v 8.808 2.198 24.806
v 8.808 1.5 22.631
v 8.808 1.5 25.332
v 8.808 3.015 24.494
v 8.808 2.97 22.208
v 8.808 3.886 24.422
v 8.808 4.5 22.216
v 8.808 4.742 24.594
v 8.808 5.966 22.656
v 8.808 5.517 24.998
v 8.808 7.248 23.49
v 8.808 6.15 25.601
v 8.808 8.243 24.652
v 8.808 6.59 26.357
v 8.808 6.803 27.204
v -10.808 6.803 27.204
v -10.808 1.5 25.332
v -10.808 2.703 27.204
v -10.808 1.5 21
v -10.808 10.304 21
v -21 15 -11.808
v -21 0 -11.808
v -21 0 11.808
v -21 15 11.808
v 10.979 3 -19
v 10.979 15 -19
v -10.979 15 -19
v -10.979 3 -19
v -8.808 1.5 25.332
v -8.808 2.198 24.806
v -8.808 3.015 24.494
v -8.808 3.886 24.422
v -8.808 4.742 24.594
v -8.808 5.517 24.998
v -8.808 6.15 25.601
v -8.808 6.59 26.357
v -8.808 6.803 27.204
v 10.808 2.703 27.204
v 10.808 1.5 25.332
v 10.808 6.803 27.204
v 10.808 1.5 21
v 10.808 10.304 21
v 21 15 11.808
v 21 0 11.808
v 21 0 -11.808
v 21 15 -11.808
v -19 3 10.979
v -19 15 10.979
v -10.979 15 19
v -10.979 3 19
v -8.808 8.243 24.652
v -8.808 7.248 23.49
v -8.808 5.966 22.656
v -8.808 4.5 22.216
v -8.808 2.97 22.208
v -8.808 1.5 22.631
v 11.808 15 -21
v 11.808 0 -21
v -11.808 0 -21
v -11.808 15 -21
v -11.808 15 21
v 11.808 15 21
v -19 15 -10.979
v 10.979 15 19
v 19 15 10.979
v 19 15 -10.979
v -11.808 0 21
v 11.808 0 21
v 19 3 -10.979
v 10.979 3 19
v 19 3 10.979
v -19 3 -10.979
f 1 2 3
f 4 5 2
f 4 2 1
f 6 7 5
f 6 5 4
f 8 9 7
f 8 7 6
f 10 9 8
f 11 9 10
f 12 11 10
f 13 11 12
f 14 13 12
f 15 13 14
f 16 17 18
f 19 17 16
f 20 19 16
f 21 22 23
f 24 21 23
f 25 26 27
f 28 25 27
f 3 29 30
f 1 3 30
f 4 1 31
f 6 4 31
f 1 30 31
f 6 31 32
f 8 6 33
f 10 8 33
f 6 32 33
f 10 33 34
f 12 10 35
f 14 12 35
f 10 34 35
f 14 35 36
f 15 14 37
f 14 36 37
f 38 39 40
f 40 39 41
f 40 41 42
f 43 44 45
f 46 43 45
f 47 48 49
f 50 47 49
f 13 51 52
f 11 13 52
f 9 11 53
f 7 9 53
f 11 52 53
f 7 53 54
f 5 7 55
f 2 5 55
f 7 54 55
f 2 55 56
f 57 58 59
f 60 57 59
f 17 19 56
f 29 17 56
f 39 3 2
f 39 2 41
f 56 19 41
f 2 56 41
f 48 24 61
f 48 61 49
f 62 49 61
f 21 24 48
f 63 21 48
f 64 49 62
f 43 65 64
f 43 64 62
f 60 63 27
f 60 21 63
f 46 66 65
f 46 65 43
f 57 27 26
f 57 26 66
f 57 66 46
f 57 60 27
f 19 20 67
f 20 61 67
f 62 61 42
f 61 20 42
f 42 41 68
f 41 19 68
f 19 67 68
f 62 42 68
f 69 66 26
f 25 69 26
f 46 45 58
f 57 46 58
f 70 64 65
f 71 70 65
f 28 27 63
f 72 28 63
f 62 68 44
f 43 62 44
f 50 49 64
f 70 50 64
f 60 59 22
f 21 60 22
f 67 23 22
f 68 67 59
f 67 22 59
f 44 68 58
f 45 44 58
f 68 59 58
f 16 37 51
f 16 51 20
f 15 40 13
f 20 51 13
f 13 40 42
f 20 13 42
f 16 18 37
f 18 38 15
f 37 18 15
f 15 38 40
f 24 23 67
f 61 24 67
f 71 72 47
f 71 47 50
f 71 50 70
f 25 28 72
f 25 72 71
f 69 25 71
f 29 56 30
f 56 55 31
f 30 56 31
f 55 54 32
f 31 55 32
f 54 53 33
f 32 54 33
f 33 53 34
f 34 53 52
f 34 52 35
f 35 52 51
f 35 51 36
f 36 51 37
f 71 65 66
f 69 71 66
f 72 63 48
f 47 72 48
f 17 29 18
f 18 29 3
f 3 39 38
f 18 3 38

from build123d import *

# Parameters (mm, degrees)
BOSS_EXTRUDE1_DEPTH = 15
CUT_EXTRUDE1_DEPTH  = 12
SKETCH4_W           = 21.61522369
SKETCH4_H           = 10.5
BOSS_EXTRUDE2_DEPTH = 12
CUT_EXTRUDE2_DEPTH  = 32.807611845
CUT_EXTRUDE4_START  = -17.615224
CUT_EXTRUDE4_DEPTH  = 17.615224


with BuildPart() as part:
    # Sketch2 → Boss-Extrude1 (new body)
    with BuildSketch(Plane(origin=(0, 0, 0), x_dir=(1, 0, 0), z_dir=(0, 1, 0))):
        Polygon((-21, 11.807611845), (-21, -11.807611845), (-11.807611845, -21), (11.807611845, -21), (21, -11.807611845), (21, 11.807611845), (11.807611845, 21), (-11.807611845, 21), align=None)
    extrude(amount=BOSS_EXTRUDE1_DEPTH)

    # Sketch3 → Cut-Extrude1 (cut)
    with BuildSketch(Plane(origin=(0, 15, 0), x_dir=(1, 0, 0), z_dir=(0, 1, 0))):
        Polygon((10.97918472, 19), (-10.97918472, 19), (-19, 10.97918472), (-19, -10.97918472), (-10.97918472, -19), (10.97918472, -19), (19, -10.97918472), (19, 10.97918472), align=None)
    extrude(amount=-CUT_EXTRUDE1_DEPTH, mode=Mode.SUBTRACT)

    # Sketch4 → Boss-Extrude2 (add)
    with BuildSketch(Plane.XY.offset(21)):
        with Locations((0, 6.75)):
            Rectangle(SKETCH4_W, SKETCH4_H)
    extrude(amount=BOSS_EXTRUDE2_DEPTH)

    # Sketch5 → Cut-Extrude2 (cut, through all)
    with BuildSketch(Plane(origin=(10.807611845, 0, 0), x_dir=(0, 0, -1), z_dir=(1, 0, 0))):
        Polygon((-25.331702881, 1.5), (-27.204226548, 2.702565985), (-27.204226548, 6.802747117), (-21, 10.304066646), (-21, 12), (-33, 12), (-33, 1.5), align=None)
    extrude(amount=-CUT_EXTRUDE2_DEPTH, mode=Mode.SUBTRACT)

    # Sketch6 → Cut-Extrude4 (cut)
    with BuildSketch(Plane(origin=(8.807611845, 0, 0), x_dir=(0, 0, -1), z_dir=(1, 0, 0)).offset(CUT_EXTRUDE4_START)):
        with BuildLine():
            Line((-27.204226548, 6.802747117), (-24.65218816, 8.242975286))
            ThreePointArc((-24.65218816, 8.242975286), (-22.383701286, 5.248553265), (-22.630570395, 1.5))
            Line((-22.630570395, 1.5), (-25.331702881, 1.5))
            ThreePointArc((-25.331702881, 1.5), (-24.594474047, 4.742322139), (-27.204226548, 6.802747117))
        make_face()
    extrude(amount=CUT_EXTRUDE4_DEPTH, mode=Mode.SUBTRACT)


solid = part.part
